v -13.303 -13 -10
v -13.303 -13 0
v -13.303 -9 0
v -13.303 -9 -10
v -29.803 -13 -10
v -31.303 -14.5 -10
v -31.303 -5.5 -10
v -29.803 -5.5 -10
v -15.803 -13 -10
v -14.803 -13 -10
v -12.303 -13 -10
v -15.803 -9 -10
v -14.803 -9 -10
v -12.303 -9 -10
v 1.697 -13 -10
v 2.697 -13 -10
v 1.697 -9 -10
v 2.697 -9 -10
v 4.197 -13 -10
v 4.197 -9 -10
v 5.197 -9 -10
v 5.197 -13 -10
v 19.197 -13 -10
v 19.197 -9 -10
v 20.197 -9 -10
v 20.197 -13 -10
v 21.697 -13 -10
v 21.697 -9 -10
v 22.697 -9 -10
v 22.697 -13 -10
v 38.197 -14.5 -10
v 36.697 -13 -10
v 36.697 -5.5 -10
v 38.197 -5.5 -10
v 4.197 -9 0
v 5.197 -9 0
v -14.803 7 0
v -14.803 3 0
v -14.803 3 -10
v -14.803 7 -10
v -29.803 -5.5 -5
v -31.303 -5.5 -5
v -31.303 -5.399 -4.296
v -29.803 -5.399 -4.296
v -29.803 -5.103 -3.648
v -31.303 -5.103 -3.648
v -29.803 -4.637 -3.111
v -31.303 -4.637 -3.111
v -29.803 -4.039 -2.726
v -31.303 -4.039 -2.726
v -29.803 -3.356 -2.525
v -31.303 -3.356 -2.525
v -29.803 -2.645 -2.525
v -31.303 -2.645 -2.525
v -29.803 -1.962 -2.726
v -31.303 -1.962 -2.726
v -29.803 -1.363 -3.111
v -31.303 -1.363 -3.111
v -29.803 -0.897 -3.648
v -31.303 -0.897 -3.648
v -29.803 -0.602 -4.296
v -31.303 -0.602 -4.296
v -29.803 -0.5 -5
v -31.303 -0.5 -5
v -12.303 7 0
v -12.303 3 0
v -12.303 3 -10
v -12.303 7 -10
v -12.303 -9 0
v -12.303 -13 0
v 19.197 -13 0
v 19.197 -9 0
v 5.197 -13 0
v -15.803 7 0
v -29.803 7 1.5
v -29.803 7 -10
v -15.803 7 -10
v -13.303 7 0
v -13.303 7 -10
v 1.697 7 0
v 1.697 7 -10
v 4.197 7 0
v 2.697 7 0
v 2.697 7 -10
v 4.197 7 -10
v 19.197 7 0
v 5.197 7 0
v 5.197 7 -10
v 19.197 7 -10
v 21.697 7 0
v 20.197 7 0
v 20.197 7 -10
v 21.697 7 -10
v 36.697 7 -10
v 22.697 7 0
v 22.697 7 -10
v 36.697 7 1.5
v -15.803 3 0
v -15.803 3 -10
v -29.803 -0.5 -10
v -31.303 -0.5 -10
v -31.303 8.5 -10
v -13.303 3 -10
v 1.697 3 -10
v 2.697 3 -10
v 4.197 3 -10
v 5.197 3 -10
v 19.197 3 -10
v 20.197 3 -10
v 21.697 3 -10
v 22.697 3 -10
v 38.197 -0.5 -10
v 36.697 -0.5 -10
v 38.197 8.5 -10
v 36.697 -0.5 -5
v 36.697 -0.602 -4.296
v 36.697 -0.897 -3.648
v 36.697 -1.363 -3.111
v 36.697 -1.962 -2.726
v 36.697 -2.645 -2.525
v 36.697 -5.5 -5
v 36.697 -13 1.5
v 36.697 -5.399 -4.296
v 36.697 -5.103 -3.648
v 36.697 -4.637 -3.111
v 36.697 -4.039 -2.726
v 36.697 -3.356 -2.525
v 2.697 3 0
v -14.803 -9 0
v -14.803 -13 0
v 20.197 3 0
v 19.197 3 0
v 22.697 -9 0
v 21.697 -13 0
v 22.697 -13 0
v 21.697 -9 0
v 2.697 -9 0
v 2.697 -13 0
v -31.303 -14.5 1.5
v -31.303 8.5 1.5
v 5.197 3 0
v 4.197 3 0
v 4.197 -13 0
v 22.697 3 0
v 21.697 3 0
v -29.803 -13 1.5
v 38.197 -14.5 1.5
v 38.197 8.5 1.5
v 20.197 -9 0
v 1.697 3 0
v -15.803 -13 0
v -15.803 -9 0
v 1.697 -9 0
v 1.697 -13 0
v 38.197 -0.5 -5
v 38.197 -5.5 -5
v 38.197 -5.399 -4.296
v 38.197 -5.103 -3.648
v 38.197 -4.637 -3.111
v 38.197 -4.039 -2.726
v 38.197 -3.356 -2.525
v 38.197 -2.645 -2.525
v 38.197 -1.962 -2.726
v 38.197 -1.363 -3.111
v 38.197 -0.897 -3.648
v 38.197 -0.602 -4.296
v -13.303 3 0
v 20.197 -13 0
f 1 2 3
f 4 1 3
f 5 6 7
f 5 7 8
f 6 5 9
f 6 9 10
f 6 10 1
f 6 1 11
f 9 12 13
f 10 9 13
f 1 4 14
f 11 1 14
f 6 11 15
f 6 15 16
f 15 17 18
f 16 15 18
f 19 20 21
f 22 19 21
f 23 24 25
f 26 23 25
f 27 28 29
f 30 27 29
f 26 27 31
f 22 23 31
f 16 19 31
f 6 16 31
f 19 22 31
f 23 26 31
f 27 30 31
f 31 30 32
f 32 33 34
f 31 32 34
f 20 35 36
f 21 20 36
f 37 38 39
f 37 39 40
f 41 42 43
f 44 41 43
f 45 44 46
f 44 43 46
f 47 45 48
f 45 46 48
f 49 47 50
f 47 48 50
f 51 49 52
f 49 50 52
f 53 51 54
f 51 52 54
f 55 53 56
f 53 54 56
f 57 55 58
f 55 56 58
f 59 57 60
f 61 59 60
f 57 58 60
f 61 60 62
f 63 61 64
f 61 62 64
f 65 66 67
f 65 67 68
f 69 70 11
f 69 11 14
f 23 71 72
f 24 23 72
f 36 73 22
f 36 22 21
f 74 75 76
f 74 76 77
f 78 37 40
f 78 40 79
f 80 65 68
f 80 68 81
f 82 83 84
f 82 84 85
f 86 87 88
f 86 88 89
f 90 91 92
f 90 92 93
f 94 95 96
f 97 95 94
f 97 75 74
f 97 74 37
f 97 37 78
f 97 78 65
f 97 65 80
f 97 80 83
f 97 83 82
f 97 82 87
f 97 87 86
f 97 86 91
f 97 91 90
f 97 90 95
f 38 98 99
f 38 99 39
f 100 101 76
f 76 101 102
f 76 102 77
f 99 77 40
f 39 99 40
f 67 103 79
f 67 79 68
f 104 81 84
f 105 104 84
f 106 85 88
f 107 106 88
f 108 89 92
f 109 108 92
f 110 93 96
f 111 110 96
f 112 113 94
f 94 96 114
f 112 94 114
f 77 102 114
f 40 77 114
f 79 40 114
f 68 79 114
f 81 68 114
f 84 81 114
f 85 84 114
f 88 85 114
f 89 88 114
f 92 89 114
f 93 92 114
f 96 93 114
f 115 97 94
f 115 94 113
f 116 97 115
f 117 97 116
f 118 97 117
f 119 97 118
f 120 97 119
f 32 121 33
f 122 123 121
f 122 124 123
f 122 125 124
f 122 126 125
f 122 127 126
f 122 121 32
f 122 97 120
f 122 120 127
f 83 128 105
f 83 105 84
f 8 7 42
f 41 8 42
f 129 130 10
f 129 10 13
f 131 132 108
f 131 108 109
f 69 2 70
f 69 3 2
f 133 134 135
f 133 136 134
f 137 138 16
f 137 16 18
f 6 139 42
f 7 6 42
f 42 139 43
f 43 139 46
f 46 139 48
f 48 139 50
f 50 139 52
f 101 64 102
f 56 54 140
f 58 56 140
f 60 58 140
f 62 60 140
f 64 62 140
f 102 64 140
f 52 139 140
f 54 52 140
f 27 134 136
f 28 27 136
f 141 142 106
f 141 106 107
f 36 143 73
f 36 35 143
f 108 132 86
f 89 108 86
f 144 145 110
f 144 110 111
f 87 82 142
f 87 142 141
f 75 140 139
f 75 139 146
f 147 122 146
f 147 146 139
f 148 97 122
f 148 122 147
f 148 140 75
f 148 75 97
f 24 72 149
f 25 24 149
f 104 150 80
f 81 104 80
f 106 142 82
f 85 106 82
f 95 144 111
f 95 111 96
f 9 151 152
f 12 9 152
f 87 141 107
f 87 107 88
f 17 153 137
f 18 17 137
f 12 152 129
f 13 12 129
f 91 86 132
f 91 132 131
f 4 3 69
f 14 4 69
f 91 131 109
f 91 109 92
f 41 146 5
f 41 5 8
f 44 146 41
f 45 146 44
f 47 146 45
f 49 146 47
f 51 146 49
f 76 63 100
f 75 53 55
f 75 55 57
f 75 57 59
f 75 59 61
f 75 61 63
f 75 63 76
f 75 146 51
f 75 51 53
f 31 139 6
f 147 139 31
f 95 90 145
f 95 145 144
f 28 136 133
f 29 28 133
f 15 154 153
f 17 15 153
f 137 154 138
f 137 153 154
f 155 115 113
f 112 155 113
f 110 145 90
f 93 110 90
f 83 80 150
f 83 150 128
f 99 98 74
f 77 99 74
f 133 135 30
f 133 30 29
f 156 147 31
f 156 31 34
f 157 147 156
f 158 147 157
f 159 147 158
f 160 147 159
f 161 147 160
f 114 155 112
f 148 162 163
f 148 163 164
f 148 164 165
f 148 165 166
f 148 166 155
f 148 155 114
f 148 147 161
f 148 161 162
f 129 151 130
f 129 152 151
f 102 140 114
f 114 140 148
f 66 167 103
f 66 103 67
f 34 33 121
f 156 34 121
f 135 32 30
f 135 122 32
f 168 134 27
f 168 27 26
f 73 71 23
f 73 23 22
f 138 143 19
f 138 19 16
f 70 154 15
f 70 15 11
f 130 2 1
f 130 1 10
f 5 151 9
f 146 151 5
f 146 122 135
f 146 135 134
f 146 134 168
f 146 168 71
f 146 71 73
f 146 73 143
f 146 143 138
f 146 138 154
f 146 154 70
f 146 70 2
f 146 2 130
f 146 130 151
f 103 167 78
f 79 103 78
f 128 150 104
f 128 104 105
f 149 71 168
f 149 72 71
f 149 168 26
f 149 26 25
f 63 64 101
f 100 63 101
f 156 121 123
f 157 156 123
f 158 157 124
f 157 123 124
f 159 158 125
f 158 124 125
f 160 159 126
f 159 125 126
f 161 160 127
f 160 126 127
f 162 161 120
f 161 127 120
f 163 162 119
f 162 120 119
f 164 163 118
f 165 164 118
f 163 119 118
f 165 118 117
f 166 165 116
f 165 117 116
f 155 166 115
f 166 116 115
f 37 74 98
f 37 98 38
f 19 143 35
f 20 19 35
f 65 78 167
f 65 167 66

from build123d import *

# Parameters (mm, degrees)
F0_W     = 69.5
F0_H     = 23
F1_DEPTH = 1.5
F0_W_2   = 1
F0_H_2   = 4
F2_DEPTH = 10
F4_DEPTH = 69.501


with BuildPart() as f1:
    # F0 (on Top) → F1 (new body)
    with BuildSketch(Plane.XY):
        with Locations((3.447164, -3.000336)):
            Rectangle(F0_W, F0_H)
        Polygon((-29.802836, -13.000336), (-29.802836, 6.999664), (-15.802836, 6.999664), (-14.802836, 6.999664), (-13.302836, 6.999664), (-12.302836, 6.999664), (1.697164, 6.999664), (2.697164, 6.999664), (4.197164, 6.999664), (5.197164, 6.999664), (19.197164, 6.999664), (20.197164, 6.999664), (21.697164, 6.999664), (22.697164, 6.999664), (36.697164, 6.999664), (36.697164, -13.000336), (22.697164, -13.000336), (21.697164, -13.000336), (20.197164, -13.000336), (19.197164, -13.000336), (5.197164, -13.000336), (4.197164, -13.000336), (2.697164, -13.000336), (1.697164, -13.000336), (-12.302836, -13.000336), (-13.302836, -13.000336), (-14.802836, -13.000336), (-15.802836, -13.000336), align=None, mode=Mode.SUBTRACT)
    extrude(amount=F1_DEPTH)

    # F0 (on Top) → F2 (join)
    with BuildSketch(Plane.XY):
        with Locations((3.447164, -3.000336)):
            Rectangle(F0_W, F0_H)
        Polygon((-29.802836, -13.000336), (-29.802836, 6.999664), (-15.802836, 6.999664), (-14.802836, 6.999664), (-13.302836, 6.999664), (-12.302836, 6.999664), (1.697164, 6.999664), (2.697164, 6.999664), (4.197164, 6.999664), (5.197164, 6.999664), (19.197164, 6.999664), (20.197164, 6.999664), (21.697164, 6.999664), (22.697164, 6.999664), (36.697164, 6.999664), (36.697164, -13.000336), (22.697164, -13.000336), (21.697164, -13.000336), (20.197164, -13.000336), (19.197164, -13.000336), (5.197164, -13.000336), (4.197164, -13.000336), (2.697164, -13.000336), (1.697164, -13.000336), (-12.302836, -13.000336), (-13.302836, -13.000336), (-14.802836, -13.000336), (-15.802836, -13.000336), align=None, mode=Mode.SUBTRACT)
        with Locations((-15.302836, -11.000336)):
            Rectangle(F0_W_2, F0_H_2)
        with Locations((-12.802836, -11.000336)):
            Rectangle(F0_W_2, F0_H_2)
        with Locations((2.197164, -11.000336)):
            Rectangle(F0_W_2, F0_H_2)
        with Locations((4.697164, -11.000336)):
            Rectangle(F0_W_2, F0_H_2)
        with Locations((19.697164, -11.000336)):
            Rectangle(F0_W_2, F0_H_2)
        with Locations((22.197164, -11.000336)):
            Rectangle(F0_W_2, F0_H_2)
        with Locations((22.197164, 4.999664)):
            Rectangle(F0_W_2, F0_H_2)
        with Locations((19.697164, 4.999664)):
            Rectangle(F0_W_2, F0_H_2)
        with Locations((4.697164, 4.999664)):
            Rectangle(F0_W_2, F0_H_2)
        with Locations((2.197164, 4.999664)):
            Rectangle(F0_W_2, F0_H_2)
        with Locations((-12.802836, 4.999664)):
            Rectangle(F0_W_2, F0_H_2)
        with Locations((-15.302836, 4.999664)):
            Rectangle(F0_W_2, F0_H_2)
    extrude(amount=-F2_DEPTH)

    # F3 (on face) → F4 (cut, through all)
    with BuildSketch(Plane(origin=(-31.302836, 0, 0), x_dir=(0, -1, 0), z_dir=(-1, 0, 0))):
        with BuildLine():
            Line((0.500336, -5), (0.500336, -10))
            Line((0.500336, -10), (5.500336, -10))
            Line((5.500336, -10), (5.500336, -5))
            ThreePointArc((5.500336, -5), (3.000336, -2.5), (0.500336, -5))
        make_face()
    extrude(amount=-F4_DEPTH, mode=Mode.SUBTRACT)


solid = f1.part
